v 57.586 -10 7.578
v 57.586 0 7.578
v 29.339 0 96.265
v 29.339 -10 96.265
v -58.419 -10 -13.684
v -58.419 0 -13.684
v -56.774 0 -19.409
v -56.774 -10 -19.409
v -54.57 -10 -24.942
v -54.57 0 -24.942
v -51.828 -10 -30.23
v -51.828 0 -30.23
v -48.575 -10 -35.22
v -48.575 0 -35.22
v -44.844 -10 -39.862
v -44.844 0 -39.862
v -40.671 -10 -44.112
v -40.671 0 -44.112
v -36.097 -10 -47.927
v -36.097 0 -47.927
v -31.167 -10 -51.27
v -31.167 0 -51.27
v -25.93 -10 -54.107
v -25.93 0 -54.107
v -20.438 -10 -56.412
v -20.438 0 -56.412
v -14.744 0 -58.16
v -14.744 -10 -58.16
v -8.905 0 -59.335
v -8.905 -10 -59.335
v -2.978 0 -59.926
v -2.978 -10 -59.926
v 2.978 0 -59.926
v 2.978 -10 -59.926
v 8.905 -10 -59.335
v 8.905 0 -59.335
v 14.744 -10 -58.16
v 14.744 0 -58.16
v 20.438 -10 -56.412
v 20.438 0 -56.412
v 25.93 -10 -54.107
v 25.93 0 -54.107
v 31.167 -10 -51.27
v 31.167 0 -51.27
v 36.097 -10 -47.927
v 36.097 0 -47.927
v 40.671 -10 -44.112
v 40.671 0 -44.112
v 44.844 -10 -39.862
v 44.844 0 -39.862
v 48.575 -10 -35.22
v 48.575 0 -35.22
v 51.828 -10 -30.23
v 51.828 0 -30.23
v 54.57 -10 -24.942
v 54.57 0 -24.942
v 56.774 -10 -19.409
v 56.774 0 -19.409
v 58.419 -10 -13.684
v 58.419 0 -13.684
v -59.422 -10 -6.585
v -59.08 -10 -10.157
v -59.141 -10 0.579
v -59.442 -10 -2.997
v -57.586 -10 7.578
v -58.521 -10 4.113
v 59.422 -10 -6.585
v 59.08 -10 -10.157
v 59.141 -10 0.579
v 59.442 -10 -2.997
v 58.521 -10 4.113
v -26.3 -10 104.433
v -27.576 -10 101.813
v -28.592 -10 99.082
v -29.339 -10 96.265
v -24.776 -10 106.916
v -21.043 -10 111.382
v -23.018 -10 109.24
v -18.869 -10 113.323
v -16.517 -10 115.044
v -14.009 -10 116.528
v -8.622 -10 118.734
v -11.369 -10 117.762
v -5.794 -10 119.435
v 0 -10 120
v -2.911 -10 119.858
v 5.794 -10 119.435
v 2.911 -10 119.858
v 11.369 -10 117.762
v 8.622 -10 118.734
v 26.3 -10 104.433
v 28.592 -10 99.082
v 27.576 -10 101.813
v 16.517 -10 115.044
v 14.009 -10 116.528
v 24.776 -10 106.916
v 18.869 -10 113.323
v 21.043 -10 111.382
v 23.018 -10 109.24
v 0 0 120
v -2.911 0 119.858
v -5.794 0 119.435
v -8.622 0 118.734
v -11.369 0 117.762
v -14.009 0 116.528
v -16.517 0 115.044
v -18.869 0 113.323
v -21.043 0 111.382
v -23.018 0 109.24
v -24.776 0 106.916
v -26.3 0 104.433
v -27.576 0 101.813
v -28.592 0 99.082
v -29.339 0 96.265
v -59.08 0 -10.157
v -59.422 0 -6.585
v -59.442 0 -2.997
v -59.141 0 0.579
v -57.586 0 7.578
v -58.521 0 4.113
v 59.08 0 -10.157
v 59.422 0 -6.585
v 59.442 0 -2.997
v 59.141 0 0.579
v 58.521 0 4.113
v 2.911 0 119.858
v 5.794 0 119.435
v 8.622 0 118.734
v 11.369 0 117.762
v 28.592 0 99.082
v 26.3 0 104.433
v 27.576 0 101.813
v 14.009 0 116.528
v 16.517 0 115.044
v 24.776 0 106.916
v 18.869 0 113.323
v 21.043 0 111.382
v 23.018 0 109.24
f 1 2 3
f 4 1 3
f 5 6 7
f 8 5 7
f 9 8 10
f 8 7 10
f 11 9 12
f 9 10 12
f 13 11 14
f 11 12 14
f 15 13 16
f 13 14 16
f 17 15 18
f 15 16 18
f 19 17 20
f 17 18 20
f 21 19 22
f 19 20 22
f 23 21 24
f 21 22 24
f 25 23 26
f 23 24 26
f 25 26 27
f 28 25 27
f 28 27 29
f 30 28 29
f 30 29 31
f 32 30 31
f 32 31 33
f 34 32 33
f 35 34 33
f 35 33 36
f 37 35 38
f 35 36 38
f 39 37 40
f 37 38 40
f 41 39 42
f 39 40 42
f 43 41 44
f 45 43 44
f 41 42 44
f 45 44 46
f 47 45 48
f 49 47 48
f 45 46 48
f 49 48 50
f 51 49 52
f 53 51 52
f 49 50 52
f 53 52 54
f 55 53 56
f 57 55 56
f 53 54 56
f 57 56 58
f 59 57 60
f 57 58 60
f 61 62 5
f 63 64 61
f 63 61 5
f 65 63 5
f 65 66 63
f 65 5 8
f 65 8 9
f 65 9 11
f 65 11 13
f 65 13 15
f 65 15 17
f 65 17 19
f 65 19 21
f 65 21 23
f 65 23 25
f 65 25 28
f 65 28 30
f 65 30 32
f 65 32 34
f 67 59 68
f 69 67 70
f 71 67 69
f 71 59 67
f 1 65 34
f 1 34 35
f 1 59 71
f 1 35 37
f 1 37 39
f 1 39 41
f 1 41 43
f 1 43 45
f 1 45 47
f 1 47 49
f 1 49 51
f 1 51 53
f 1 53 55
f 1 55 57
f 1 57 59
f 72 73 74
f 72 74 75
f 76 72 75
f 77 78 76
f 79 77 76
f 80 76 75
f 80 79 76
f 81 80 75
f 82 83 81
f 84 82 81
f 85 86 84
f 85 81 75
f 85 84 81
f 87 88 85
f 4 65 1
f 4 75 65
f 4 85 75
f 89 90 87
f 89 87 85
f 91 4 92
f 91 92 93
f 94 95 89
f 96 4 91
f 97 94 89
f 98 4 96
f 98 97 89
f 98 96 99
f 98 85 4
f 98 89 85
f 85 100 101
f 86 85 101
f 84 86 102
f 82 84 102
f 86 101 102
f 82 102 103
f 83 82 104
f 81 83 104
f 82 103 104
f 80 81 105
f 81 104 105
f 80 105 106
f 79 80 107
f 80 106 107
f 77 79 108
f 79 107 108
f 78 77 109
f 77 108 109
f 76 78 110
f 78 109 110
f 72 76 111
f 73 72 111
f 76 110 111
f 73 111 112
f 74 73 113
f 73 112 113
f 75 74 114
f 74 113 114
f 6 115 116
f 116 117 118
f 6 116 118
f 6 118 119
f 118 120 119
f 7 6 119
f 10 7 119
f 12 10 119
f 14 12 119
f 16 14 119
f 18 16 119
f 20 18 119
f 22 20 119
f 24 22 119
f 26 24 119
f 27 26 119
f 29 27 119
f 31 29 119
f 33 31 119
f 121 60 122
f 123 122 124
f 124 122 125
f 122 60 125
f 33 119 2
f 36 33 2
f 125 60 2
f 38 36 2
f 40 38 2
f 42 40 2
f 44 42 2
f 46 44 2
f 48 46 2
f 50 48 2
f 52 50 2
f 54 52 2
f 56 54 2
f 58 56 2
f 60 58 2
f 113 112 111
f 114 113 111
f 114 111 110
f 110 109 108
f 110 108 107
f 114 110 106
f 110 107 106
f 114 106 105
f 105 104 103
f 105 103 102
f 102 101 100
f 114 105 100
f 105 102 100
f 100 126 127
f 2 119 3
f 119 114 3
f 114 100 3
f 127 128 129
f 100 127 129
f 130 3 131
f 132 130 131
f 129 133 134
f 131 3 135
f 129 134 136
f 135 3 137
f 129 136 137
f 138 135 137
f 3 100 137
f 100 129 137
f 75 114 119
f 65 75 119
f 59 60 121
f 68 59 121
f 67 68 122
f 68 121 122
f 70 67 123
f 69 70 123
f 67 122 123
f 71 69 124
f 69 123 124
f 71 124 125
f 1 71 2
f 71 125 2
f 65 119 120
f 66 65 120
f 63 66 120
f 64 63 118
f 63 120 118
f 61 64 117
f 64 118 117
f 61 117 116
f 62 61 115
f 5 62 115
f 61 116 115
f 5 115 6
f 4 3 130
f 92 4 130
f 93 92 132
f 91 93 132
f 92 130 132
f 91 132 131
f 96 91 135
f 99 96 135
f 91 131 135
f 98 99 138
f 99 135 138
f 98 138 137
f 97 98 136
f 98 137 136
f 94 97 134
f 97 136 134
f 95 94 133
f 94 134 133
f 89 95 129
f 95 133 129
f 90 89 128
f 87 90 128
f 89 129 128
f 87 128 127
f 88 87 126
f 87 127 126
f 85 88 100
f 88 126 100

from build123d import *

# Parameters (mm, degrees)
F1_DEPTH = 10


with BuildPart() as f1:
    # F0 (on Front) → F1 (new body)
    with BuildSketch(Plane.XZ):
        with BuildLine():
            ThreePointArc((-57.586286, 7.57811), (-59.44227, -2.996741), (-58.418656, -13.684322))
            ThreePointArc((-58.418656, -13.684322), (0, -60), (58.418656, -13.684322))
            ThreePointArc((58.418656, -13.684322), (59.44227, -2.996741), (57.586286, 7.57811))
            Line((57.586286, 7.57811), (29.338606, 96.264676))
            ThreePointArc((29.338606, 96.264676), (18.868753, 113.323168), (0, 120))
            ThreePointArc((0, 120), (-18.868753, 113.323168), (-29.338606, 96.264676))
            Line((-29.338606, 96.264676), (-57.586286, 7.57811))
        make_face()
    extrude(amount=F1_DEPTH)


solid = f1.part
